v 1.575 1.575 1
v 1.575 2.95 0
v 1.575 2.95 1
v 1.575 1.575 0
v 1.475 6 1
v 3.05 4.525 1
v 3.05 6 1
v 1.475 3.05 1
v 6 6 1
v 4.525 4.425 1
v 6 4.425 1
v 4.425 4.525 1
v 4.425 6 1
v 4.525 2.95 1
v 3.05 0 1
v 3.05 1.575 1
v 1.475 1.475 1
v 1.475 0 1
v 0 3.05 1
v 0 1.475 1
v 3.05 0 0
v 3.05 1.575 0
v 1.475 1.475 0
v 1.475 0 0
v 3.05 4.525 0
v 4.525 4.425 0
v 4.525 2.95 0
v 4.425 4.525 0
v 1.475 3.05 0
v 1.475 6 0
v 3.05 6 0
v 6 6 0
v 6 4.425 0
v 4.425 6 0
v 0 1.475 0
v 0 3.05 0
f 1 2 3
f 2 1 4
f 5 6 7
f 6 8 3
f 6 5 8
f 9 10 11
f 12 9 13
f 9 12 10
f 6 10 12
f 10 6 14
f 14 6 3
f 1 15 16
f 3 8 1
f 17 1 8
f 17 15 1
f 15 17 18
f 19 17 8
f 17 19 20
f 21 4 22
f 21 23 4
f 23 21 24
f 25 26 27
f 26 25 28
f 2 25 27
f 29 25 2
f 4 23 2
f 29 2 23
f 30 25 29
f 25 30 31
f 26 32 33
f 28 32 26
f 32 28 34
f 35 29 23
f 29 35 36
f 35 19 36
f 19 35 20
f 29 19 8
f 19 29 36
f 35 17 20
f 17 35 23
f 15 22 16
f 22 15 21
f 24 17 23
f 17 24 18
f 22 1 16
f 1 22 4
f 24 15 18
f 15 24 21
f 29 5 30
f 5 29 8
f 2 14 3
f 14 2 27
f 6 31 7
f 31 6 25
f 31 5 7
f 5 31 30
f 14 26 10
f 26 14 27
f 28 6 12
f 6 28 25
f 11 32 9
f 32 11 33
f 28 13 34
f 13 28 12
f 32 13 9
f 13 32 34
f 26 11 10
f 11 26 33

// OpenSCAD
// Uncomment this block to see how to use MQR-Code

id = 1234;
width = 6;
size = 4;
height = 1; // Set to 0 if you want to export in 2D DXF.
inter = -0.1; // Don't set to 0 because it could create polygon intersections errors.

// 3D printer :
translate([0, 0,-1]) %cube([width, width, 1]);
mqr_code(id, width, size, height, inter);

// CNC :
// mqr_code(id, width, size, 0, inter);

module mqr_code(code, w, s, h=1, i=-0.1)
{
	for(it = [0:s*s-2])
		if (int2bin(code, it) == 1) translate([floor(it/s)*(w+i)/s, (it%s)*(w+i)/s, 0])
			mqr_square((w+i)/s, h, i);
	
	if (paritybit(code) == 1) translate([(s-1)*(w+i)/s, (s-1)*(w+i)/s, 0])
		mqr_square((w+i)/s, h, i);
}

module mqr_square(w, h, i)
{
	if (h > 0) cube([w-i, w-i, h]);
	else square(w-i, w-i);
}

function paritybit(code, pb=0) = (code==0) ? pb : paritybit(floor(code/2), (code%2+pb)%2);
function int2bin(nb, i) = floor( nb/pow(2, i) ) % 2;
